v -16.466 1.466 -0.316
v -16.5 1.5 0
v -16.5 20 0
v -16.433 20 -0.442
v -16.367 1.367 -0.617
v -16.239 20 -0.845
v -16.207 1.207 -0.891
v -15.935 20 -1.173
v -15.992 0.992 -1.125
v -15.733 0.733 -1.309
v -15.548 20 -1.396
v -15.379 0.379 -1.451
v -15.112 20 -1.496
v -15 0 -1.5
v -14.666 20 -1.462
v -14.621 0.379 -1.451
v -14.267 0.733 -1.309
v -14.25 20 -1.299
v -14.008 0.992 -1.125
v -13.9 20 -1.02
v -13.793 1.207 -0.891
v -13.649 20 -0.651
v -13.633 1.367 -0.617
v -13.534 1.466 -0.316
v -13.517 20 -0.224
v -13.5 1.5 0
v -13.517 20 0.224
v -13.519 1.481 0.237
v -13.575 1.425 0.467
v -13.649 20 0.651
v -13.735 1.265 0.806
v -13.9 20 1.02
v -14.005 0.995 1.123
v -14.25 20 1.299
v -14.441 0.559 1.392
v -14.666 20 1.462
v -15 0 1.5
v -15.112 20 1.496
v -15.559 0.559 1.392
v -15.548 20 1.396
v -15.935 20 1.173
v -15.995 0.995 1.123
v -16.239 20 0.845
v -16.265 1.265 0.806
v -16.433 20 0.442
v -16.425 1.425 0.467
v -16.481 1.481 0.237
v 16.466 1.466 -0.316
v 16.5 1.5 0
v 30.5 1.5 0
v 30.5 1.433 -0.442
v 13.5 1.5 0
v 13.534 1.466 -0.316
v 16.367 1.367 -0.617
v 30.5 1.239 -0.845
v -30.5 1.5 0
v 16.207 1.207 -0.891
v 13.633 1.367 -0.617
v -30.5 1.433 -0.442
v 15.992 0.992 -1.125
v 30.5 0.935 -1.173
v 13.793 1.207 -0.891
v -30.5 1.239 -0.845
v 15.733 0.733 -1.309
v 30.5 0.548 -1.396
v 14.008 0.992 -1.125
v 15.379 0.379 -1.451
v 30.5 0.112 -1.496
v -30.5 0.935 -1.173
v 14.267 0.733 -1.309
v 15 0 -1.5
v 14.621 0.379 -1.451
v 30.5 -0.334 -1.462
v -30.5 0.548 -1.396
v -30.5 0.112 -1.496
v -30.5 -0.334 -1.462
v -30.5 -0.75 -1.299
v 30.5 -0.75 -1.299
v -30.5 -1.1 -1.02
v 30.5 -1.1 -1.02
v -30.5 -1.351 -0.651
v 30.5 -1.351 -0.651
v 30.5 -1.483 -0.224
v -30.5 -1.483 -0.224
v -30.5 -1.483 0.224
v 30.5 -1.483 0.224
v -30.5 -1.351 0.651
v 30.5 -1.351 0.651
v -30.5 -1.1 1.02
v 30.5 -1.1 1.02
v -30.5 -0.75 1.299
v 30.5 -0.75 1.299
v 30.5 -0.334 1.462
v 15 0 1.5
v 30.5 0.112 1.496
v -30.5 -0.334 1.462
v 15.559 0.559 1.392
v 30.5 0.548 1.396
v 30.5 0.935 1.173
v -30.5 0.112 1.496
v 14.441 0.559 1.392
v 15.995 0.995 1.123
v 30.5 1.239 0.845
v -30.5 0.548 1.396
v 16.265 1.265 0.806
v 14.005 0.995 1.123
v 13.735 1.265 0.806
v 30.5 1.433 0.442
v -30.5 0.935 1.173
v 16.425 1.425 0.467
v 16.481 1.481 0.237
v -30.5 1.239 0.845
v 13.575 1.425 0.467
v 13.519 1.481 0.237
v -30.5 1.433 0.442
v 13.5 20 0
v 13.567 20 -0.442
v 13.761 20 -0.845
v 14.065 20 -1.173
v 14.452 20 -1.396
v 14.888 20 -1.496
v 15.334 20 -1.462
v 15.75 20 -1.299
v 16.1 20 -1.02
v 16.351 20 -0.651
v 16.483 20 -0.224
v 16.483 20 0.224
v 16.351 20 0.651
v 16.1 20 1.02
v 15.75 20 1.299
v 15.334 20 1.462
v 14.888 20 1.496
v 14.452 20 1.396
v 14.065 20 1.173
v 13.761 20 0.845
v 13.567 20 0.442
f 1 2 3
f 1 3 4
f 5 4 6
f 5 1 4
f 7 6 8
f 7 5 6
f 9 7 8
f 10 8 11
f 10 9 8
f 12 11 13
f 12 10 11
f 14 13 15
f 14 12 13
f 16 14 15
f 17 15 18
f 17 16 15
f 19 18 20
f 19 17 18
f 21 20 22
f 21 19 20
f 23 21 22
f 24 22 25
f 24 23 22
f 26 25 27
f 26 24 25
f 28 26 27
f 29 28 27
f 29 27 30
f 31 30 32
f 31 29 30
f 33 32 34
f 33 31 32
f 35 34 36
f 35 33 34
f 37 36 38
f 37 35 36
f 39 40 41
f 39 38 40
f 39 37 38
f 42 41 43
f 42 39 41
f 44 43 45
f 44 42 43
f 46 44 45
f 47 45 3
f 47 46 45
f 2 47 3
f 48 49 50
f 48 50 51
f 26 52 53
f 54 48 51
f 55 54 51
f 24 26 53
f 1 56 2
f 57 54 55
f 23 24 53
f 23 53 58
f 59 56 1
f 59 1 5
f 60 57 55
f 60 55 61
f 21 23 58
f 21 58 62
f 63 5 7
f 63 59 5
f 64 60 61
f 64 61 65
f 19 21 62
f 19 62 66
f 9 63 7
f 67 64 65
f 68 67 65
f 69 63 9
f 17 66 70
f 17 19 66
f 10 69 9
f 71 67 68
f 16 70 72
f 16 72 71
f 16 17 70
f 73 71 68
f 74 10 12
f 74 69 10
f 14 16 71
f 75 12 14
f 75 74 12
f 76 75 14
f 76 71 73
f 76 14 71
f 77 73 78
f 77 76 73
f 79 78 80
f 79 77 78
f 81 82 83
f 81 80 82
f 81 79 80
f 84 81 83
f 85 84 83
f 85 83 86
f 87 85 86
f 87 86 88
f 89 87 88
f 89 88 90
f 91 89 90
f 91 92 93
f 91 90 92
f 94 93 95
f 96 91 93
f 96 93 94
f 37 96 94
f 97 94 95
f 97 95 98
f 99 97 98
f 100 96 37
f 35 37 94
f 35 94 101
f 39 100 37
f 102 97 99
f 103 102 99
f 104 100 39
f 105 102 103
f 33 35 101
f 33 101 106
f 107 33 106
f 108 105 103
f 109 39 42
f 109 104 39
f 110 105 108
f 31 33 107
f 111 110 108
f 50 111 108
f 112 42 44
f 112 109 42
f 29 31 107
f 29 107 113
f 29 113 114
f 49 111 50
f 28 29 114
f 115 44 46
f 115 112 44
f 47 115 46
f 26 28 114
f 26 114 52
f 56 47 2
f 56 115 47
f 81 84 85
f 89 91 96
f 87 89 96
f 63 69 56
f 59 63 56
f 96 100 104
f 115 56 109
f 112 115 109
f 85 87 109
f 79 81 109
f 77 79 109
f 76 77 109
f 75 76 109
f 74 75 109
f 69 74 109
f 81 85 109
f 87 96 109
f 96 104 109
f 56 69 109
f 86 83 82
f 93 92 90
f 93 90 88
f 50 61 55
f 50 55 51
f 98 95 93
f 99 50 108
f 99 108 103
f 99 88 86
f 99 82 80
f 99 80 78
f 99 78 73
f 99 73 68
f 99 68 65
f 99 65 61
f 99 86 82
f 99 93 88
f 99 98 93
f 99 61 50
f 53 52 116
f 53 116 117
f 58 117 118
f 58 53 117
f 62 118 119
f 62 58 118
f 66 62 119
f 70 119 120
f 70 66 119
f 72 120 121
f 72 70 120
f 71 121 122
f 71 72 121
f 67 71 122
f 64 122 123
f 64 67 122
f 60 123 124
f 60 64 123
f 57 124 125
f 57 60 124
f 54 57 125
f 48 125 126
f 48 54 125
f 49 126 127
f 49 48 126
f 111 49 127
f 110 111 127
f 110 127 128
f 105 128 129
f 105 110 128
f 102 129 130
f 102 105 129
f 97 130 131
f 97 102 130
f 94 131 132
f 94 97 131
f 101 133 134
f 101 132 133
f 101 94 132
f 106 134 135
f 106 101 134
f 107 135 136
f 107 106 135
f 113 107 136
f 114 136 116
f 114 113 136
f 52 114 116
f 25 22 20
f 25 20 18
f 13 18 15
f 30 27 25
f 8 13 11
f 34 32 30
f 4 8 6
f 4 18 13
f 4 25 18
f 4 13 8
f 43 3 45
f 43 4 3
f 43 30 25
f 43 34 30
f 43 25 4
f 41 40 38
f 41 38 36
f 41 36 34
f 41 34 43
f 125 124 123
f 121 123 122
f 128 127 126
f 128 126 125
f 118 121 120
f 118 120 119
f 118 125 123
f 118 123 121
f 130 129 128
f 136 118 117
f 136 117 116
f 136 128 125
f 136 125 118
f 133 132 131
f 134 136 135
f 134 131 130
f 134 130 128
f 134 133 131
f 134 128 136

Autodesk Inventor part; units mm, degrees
ref_plane "XY Plane" through (0, 0, 0) normal (0, 0, 1) x (1, 0, 0)
sketch "Skizze1" plane through (0, 0, 0) normal (0, 0, 1) x (1, 0, 0)
  line L0 (-30.5, 0) -> (30.5, 0)
  line L1 (30.5, 0) -> (30.5, 1.5)
  line L2 (30.5, 1.5) -> (-30.5, 1.5)
  line L3 (-30.5, 1.5) -> (-30.5, 0)
  line L4 (-42.7, 0) -> (42.7, 0) projected
  line L5 (0, 1.8) -> (0, -0.3) projected
  point P0 (0, 0)
  dimension "d0" = 61
  dimension "d1" = 1.5
  dimension "d2" = 0
  dimension "d10" = 30.5
revolve "Umdrehung1" add sketch "Skizze1" angle 360 about axis through (0, 0, 0) along (1, 0, 0)
sketch "Skizze2" plane through (0, 0, 0) normal (0, 1, 0) x (-1, 0, 0)
  circle A0 centre (15, 0) radius 1.5
  circle A1 centre (-15, 0) radius 1.5
  point P0 (0, 0)
  dimension "d4" = 3
  dimension "d5" = 3
  dimension "d6" = 15
  dimension "d7" = 15
extrude "Extrusion1" add sketch "Skizze2" along normal blind 20
properties part number "Adaptation_2"
